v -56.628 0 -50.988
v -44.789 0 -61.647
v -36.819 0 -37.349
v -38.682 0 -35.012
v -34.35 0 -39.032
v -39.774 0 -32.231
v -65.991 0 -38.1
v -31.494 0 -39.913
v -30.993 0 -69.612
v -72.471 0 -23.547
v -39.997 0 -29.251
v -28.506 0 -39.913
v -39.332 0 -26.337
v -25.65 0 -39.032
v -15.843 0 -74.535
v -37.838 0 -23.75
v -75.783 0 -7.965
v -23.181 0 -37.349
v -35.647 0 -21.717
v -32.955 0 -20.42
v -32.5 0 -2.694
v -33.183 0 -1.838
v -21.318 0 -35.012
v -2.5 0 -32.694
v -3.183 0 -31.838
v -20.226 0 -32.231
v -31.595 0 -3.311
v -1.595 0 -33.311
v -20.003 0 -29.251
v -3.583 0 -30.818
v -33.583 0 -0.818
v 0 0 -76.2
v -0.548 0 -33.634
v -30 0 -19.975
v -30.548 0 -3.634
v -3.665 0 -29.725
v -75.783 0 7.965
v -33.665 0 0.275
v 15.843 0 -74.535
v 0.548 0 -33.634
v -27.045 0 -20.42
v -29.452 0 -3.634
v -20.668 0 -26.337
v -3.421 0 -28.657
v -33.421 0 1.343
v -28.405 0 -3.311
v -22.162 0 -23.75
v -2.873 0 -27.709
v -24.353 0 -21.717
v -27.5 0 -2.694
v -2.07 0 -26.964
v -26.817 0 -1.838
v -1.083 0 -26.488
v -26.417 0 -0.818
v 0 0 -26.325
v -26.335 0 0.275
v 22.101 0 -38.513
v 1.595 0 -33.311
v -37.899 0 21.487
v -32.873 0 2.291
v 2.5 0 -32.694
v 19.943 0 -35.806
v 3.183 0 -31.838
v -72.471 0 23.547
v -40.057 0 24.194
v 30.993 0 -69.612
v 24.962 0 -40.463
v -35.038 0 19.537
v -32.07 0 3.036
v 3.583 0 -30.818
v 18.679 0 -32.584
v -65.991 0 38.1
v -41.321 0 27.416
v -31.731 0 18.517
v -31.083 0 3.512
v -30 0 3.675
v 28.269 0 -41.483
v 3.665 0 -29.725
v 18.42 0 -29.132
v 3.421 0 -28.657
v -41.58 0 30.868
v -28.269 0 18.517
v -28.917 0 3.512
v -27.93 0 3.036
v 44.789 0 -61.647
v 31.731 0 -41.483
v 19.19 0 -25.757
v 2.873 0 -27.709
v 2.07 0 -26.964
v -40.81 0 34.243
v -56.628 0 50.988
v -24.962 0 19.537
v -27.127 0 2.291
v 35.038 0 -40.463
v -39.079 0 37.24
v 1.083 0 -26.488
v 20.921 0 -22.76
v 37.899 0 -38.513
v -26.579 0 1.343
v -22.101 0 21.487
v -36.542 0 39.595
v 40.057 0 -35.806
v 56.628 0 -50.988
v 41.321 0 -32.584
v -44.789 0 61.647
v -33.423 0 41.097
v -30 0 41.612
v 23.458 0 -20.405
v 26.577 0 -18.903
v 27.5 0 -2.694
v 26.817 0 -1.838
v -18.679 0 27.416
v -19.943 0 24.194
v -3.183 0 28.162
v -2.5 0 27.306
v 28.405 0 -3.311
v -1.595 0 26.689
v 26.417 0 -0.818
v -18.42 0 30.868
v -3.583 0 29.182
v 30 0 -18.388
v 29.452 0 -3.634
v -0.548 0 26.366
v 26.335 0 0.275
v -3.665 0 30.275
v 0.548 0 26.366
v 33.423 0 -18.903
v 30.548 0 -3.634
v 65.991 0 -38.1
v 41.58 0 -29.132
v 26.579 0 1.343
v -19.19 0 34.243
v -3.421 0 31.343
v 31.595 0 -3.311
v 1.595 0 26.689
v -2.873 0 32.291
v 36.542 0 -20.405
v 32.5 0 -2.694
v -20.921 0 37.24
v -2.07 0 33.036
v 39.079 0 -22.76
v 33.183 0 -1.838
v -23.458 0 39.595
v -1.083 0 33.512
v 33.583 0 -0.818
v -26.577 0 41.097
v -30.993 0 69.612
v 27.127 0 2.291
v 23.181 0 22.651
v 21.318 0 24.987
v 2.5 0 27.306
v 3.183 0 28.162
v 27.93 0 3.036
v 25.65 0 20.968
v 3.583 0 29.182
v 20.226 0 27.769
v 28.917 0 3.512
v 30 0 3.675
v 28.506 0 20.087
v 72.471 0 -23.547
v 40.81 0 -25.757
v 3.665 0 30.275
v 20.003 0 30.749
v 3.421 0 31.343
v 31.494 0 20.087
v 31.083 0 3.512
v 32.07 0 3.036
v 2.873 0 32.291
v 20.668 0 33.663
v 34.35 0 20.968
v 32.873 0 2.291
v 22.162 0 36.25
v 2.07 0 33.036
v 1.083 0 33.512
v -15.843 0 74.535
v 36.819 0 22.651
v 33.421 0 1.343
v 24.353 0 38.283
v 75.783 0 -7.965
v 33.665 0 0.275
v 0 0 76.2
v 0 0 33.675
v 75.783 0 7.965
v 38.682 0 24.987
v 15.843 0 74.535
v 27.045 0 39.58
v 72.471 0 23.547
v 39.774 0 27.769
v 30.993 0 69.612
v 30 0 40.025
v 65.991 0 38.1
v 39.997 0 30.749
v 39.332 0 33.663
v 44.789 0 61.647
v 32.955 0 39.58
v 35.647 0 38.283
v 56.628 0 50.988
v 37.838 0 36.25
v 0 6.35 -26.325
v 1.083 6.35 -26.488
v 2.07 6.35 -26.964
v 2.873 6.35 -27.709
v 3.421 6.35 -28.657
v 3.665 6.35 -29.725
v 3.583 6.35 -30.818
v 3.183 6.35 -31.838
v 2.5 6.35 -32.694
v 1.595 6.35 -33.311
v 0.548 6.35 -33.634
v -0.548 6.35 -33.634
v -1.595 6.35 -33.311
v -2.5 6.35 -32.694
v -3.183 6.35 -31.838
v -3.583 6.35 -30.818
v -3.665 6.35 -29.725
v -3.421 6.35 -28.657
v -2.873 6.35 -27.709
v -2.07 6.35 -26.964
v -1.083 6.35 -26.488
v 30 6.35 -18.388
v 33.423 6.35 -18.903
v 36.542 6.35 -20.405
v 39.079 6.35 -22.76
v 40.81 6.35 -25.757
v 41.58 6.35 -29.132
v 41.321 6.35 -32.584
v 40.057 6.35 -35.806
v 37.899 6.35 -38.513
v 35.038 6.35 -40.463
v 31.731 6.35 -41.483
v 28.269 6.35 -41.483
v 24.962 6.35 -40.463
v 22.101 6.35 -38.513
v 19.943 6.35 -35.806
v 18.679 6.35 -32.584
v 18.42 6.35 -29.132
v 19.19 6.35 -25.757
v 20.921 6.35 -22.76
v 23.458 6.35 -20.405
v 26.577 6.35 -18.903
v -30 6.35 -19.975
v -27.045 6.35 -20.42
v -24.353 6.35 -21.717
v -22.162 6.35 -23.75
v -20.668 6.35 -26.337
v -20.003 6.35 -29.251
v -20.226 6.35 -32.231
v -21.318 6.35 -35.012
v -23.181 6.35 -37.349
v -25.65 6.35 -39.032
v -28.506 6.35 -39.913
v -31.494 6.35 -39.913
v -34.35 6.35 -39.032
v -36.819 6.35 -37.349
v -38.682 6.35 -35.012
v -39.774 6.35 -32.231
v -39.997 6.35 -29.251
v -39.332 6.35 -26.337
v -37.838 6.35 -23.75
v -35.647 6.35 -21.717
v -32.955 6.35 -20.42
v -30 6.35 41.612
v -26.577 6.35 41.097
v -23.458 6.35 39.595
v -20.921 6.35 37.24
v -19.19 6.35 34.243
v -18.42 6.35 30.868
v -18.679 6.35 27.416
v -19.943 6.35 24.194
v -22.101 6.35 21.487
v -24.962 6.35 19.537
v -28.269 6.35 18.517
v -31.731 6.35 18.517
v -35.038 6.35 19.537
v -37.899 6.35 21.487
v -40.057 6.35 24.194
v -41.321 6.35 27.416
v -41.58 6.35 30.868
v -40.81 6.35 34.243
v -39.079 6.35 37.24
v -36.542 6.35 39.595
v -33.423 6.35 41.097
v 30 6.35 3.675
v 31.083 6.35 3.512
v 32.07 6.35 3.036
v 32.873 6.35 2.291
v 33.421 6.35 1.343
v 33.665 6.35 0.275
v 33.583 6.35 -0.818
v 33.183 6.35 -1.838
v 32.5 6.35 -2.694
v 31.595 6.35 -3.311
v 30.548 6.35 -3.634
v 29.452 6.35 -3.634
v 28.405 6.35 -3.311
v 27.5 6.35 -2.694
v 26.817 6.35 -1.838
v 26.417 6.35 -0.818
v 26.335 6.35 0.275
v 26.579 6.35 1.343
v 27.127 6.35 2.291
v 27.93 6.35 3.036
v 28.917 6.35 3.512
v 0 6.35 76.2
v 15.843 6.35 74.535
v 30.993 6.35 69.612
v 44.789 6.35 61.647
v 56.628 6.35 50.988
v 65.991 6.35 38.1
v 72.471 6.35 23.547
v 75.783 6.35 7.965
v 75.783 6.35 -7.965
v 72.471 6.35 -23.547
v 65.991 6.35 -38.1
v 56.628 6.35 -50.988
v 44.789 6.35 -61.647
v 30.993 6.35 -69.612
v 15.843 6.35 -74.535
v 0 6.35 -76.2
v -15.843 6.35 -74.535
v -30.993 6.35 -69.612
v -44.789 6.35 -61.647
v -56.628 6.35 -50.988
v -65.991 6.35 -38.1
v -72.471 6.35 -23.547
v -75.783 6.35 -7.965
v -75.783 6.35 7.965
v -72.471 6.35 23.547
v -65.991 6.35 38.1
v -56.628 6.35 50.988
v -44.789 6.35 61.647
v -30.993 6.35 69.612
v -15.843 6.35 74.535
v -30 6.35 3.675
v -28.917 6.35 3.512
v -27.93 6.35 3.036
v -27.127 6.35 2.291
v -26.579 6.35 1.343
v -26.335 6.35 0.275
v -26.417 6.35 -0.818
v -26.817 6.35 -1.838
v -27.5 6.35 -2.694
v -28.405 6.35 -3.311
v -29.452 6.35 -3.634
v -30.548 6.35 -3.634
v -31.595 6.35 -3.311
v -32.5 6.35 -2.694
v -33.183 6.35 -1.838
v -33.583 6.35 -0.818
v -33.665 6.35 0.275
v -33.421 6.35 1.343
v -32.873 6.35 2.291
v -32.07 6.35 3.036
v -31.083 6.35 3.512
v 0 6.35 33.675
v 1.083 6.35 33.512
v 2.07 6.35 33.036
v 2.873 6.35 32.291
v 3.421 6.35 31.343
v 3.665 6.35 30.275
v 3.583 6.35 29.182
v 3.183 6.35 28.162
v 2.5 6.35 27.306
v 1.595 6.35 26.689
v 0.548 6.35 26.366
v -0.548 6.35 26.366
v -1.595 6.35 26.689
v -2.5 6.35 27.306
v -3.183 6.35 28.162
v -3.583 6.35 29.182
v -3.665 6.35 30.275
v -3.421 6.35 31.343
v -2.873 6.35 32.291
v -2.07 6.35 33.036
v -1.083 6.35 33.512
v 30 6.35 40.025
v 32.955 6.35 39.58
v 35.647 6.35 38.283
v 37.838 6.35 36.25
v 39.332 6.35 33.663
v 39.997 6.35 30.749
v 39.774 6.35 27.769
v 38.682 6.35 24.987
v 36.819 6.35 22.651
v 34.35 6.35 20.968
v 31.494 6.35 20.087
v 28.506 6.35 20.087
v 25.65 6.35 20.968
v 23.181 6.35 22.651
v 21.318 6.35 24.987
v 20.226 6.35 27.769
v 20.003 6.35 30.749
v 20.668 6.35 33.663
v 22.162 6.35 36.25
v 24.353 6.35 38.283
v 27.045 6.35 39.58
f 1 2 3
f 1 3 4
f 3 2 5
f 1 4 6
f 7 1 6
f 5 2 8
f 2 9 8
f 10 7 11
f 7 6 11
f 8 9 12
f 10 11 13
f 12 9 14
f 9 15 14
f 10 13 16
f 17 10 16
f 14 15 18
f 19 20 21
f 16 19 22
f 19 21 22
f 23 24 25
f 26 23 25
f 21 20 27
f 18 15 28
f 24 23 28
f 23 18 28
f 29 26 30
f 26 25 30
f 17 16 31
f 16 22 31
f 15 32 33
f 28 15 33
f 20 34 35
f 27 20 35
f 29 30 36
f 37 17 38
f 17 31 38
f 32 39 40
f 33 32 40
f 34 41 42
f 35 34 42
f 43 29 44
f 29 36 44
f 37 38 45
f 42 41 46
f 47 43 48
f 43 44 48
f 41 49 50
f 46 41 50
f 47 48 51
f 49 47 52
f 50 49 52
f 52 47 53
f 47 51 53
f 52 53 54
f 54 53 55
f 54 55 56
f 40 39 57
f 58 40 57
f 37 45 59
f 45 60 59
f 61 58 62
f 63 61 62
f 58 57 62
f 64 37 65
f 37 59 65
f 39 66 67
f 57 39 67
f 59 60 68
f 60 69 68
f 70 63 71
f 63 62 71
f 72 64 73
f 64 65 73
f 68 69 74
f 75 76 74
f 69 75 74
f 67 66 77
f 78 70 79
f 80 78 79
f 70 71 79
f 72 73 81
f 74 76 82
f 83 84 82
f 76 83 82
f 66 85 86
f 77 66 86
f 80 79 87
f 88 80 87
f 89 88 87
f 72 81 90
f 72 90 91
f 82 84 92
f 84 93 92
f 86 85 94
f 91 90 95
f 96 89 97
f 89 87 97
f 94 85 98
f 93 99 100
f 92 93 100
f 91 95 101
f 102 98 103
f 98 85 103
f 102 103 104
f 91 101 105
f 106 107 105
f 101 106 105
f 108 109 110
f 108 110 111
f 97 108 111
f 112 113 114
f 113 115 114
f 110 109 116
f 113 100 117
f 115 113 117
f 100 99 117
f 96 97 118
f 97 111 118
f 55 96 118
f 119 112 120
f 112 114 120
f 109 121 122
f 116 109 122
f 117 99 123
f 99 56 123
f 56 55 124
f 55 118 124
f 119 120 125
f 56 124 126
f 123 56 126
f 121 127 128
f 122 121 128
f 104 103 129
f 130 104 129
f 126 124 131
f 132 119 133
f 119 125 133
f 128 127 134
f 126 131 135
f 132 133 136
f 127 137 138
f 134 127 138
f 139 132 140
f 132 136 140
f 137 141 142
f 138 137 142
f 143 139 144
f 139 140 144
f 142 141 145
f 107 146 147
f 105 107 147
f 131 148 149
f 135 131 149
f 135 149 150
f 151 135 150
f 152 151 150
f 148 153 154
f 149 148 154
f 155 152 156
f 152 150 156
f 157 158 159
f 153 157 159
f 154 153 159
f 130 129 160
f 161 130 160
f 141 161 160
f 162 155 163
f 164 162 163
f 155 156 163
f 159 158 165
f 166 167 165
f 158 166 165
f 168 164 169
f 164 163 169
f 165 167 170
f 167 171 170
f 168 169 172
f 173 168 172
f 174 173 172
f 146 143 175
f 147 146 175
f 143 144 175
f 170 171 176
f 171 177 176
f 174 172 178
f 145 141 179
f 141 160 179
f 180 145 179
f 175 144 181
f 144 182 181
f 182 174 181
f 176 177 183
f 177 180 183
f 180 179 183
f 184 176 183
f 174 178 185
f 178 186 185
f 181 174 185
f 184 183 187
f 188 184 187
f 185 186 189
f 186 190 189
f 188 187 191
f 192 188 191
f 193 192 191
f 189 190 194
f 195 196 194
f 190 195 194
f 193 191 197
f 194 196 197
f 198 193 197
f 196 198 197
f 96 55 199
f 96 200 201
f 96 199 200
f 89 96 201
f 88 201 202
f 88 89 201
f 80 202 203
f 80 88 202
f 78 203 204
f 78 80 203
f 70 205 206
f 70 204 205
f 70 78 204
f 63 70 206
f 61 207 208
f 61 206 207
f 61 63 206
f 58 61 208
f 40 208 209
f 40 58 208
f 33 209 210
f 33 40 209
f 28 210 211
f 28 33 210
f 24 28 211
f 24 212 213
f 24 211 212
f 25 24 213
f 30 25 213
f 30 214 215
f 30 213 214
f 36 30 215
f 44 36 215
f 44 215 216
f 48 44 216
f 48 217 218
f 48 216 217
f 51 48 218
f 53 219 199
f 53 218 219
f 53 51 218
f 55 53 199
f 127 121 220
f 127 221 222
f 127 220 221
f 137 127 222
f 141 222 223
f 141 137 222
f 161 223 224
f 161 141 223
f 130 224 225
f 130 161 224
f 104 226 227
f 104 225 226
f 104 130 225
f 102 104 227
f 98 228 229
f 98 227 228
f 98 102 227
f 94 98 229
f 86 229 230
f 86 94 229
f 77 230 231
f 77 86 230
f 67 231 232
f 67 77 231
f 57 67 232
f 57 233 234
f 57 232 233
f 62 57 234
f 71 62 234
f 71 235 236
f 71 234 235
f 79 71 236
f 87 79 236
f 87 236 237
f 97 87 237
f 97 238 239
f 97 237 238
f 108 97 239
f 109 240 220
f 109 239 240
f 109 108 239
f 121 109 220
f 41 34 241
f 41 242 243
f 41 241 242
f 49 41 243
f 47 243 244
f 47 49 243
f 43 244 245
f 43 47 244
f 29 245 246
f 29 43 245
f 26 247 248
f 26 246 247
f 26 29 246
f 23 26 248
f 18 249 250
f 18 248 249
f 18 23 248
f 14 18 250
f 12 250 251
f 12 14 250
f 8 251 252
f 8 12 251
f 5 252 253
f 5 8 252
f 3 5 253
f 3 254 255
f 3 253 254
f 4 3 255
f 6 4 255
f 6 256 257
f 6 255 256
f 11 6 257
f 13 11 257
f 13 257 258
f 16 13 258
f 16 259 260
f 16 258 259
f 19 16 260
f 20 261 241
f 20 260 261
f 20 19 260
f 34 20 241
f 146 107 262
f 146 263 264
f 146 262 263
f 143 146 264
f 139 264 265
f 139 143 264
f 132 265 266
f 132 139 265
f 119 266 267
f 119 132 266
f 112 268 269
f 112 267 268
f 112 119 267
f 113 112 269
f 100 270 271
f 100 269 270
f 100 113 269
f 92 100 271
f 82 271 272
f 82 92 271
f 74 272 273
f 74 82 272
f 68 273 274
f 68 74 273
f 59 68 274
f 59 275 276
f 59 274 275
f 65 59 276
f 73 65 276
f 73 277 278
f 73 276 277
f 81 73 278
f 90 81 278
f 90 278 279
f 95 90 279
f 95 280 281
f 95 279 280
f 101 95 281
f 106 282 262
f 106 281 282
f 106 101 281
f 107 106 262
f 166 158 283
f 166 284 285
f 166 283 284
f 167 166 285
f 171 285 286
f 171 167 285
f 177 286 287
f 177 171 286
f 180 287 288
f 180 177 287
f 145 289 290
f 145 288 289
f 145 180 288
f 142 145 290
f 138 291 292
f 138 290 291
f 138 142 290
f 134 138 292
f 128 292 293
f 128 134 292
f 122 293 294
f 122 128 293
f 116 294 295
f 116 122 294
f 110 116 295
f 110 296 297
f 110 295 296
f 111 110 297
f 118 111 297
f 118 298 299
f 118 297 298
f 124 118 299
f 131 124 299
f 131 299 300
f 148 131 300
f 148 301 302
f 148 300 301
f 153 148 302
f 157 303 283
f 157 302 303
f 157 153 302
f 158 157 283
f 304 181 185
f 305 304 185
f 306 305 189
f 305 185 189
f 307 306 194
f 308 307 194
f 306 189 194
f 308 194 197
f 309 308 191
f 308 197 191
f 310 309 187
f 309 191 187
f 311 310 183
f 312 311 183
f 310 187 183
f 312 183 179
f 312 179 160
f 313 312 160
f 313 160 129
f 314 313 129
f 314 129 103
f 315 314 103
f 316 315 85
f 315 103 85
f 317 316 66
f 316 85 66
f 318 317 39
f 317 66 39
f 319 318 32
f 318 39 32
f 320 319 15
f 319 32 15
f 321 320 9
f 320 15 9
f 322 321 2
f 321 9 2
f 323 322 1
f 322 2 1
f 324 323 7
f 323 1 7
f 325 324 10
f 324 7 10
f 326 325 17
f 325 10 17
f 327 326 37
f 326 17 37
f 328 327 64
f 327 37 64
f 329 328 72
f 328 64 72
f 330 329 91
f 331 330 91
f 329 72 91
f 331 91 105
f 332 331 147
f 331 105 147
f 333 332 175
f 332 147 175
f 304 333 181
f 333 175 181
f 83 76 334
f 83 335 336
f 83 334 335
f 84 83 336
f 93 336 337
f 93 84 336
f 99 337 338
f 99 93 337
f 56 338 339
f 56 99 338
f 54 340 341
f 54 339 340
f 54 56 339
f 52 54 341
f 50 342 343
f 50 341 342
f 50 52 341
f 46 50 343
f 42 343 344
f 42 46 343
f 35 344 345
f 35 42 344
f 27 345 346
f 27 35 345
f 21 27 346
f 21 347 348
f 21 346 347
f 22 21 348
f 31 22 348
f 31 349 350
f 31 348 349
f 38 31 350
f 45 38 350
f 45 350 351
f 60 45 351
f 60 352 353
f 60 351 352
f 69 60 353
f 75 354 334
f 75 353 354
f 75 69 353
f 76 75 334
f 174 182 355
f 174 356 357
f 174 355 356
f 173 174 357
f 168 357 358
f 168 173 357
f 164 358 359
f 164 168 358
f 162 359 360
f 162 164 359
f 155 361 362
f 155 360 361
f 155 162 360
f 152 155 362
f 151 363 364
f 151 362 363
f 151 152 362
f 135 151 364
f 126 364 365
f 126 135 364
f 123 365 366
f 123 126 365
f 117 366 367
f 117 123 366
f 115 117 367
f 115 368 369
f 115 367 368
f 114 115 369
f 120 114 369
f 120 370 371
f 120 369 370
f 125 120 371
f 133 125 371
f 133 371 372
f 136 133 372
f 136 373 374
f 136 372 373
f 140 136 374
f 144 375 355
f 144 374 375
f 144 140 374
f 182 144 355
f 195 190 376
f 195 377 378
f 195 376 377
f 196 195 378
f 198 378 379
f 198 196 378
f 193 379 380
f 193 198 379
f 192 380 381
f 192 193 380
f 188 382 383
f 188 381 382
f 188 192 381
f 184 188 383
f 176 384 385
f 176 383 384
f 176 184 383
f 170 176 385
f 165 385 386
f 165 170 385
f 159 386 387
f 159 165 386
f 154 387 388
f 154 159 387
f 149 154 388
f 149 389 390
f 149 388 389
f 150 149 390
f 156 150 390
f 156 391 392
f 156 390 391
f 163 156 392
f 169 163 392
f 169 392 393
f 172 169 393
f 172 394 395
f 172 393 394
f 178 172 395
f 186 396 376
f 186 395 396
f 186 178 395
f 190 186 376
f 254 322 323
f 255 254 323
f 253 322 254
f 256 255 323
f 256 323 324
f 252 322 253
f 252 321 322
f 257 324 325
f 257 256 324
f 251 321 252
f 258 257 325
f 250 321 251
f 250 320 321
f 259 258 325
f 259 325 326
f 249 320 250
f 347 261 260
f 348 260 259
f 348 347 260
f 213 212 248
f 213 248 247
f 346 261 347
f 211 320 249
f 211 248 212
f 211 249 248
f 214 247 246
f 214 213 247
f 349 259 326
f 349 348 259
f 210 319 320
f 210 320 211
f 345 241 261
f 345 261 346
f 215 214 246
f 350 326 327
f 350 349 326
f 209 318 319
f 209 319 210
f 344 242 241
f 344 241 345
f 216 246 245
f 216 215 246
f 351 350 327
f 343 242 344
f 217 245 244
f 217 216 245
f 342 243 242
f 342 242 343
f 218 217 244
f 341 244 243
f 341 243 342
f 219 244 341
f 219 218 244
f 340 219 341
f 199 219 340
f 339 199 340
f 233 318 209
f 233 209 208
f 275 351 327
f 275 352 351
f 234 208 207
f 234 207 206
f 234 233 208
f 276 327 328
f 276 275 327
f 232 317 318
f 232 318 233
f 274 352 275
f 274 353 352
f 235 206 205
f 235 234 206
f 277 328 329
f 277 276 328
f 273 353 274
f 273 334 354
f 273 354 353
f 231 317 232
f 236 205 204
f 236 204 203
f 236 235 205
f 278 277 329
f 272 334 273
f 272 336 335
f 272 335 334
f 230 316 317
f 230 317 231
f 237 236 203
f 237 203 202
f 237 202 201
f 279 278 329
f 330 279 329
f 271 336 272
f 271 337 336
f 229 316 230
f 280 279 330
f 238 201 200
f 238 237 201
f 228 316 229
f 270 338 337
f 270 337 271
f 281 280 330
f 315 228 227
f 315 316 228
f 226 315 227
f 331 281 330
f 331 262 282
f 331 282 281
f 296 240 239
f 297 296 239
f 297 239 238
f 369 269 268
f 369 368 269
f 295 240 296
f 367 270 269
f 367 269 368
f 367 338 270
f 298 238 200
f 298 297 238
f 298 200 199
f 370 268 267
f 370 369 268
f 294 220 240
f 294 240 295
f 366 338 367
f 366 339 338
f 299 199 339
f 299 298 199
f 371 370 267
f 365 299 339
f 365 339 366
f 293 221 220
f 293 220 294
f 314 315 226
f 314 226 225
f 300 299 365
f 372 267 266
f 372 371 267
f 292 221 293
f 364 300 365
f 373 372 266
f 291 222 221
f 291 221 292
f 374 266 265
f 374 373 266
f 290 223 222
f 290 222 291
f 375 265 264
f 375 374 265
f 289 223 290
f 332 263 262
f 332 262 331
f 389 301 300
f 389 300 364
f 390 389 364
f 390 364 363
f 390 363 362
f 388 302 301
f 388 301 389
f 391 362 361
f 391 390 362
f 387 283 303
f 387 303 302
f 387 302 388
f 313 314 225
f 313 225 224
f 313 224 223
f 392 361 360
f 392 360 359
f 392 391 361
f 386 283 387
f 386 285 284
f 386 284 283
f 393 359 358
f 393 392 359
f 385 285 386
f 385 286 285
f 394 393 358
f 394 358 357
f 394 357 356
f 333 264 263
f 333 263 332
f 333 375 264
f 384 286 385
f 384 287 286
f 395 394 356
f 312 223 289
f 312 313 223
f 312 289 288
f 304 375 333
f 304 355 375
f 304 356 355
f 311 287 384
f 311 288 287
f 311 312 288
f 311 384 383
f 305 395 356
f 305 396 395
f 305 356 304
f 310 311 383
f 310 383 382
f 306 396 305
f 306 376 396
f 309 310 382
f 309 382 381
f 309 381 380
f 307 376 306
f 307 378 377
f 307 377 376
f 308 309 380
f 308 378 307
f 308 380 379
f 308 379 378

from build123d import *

# Parameters (mm, degrees)
SKETCH1_R               = 76.2
BOSS_EXTRUDE1_DEPTH     = 6.35
CUT_EXTRUDE3_DEPTH      = 108.95
CUT_EXTRUDE3_DEPTH_BACK = 108.95
SKETCH3_R               = 10.025
SKETCH3_R_2             = 3.675
SKETCH3_R_3             = 11.6125


with BuildPart() as part:
    # Sketch1 → Boss-Extrude1 (new body)
    with BuildSketch(Plane(origin=(0, 0, 0), x_dir=(1, 0, 0), z_dir=(0, 1, 0))):
        with Locations(Location((0, 0, 0), (0, 0, 270))):
            Circle(SKETCH1_R)
    extrude(amount=BOSS_EXTRUDE1_DEPTH)

    # Sketch3 → Cut-Extrude3 (cut, two sides: drawn at the far end of the back side and taken through both)
    with BuildSketch(Plane(origin=(0, 0, 0), x_dir=(1, 0, 0), z_dir=(0, 1, 0)).offset(-CUT_EXTRUDE3_DEPTH_BACK)):
        with Locations(Location((-30, 30, 0), (0, 0, 270))):
            Circle(SKETCH3_R)
        with Locations(Location((30, -30, 0), (0, 0, 270))):
            Circle(SKETCH3_R)
        with Locations(Location((0, 30, 0), (0, 0, 270))):
            Circle(SKETCH3_R_2)
        with Locations(Location((30, 0, 0), (0, 0, 270))):
            Circle(SKETCH3_R_2)
        with Locations(Location((0, -30, 0), (0, 0, 270))):
            Circle(SKETCH3_R_2)
        with Locations(Location((-30, 0, 0), (0, 0, 270))):
            Circle(SKETCH3_R_2)
        with Locations(Location((30, 30, 0), (0, 0, 270))):
            Circle(SKETCH3_R_3)
        with Locations(Location((-30, -30, 0), (0, 0, 270))):
            Circle(SKETCH3_R_3)
    extrude(amount=CUT_EXTRUDE3_DEPTH + CUT_EXTRUDE3_DEPTH_BACK, mode=Mode.SUBTRACT)


solid = part.part
